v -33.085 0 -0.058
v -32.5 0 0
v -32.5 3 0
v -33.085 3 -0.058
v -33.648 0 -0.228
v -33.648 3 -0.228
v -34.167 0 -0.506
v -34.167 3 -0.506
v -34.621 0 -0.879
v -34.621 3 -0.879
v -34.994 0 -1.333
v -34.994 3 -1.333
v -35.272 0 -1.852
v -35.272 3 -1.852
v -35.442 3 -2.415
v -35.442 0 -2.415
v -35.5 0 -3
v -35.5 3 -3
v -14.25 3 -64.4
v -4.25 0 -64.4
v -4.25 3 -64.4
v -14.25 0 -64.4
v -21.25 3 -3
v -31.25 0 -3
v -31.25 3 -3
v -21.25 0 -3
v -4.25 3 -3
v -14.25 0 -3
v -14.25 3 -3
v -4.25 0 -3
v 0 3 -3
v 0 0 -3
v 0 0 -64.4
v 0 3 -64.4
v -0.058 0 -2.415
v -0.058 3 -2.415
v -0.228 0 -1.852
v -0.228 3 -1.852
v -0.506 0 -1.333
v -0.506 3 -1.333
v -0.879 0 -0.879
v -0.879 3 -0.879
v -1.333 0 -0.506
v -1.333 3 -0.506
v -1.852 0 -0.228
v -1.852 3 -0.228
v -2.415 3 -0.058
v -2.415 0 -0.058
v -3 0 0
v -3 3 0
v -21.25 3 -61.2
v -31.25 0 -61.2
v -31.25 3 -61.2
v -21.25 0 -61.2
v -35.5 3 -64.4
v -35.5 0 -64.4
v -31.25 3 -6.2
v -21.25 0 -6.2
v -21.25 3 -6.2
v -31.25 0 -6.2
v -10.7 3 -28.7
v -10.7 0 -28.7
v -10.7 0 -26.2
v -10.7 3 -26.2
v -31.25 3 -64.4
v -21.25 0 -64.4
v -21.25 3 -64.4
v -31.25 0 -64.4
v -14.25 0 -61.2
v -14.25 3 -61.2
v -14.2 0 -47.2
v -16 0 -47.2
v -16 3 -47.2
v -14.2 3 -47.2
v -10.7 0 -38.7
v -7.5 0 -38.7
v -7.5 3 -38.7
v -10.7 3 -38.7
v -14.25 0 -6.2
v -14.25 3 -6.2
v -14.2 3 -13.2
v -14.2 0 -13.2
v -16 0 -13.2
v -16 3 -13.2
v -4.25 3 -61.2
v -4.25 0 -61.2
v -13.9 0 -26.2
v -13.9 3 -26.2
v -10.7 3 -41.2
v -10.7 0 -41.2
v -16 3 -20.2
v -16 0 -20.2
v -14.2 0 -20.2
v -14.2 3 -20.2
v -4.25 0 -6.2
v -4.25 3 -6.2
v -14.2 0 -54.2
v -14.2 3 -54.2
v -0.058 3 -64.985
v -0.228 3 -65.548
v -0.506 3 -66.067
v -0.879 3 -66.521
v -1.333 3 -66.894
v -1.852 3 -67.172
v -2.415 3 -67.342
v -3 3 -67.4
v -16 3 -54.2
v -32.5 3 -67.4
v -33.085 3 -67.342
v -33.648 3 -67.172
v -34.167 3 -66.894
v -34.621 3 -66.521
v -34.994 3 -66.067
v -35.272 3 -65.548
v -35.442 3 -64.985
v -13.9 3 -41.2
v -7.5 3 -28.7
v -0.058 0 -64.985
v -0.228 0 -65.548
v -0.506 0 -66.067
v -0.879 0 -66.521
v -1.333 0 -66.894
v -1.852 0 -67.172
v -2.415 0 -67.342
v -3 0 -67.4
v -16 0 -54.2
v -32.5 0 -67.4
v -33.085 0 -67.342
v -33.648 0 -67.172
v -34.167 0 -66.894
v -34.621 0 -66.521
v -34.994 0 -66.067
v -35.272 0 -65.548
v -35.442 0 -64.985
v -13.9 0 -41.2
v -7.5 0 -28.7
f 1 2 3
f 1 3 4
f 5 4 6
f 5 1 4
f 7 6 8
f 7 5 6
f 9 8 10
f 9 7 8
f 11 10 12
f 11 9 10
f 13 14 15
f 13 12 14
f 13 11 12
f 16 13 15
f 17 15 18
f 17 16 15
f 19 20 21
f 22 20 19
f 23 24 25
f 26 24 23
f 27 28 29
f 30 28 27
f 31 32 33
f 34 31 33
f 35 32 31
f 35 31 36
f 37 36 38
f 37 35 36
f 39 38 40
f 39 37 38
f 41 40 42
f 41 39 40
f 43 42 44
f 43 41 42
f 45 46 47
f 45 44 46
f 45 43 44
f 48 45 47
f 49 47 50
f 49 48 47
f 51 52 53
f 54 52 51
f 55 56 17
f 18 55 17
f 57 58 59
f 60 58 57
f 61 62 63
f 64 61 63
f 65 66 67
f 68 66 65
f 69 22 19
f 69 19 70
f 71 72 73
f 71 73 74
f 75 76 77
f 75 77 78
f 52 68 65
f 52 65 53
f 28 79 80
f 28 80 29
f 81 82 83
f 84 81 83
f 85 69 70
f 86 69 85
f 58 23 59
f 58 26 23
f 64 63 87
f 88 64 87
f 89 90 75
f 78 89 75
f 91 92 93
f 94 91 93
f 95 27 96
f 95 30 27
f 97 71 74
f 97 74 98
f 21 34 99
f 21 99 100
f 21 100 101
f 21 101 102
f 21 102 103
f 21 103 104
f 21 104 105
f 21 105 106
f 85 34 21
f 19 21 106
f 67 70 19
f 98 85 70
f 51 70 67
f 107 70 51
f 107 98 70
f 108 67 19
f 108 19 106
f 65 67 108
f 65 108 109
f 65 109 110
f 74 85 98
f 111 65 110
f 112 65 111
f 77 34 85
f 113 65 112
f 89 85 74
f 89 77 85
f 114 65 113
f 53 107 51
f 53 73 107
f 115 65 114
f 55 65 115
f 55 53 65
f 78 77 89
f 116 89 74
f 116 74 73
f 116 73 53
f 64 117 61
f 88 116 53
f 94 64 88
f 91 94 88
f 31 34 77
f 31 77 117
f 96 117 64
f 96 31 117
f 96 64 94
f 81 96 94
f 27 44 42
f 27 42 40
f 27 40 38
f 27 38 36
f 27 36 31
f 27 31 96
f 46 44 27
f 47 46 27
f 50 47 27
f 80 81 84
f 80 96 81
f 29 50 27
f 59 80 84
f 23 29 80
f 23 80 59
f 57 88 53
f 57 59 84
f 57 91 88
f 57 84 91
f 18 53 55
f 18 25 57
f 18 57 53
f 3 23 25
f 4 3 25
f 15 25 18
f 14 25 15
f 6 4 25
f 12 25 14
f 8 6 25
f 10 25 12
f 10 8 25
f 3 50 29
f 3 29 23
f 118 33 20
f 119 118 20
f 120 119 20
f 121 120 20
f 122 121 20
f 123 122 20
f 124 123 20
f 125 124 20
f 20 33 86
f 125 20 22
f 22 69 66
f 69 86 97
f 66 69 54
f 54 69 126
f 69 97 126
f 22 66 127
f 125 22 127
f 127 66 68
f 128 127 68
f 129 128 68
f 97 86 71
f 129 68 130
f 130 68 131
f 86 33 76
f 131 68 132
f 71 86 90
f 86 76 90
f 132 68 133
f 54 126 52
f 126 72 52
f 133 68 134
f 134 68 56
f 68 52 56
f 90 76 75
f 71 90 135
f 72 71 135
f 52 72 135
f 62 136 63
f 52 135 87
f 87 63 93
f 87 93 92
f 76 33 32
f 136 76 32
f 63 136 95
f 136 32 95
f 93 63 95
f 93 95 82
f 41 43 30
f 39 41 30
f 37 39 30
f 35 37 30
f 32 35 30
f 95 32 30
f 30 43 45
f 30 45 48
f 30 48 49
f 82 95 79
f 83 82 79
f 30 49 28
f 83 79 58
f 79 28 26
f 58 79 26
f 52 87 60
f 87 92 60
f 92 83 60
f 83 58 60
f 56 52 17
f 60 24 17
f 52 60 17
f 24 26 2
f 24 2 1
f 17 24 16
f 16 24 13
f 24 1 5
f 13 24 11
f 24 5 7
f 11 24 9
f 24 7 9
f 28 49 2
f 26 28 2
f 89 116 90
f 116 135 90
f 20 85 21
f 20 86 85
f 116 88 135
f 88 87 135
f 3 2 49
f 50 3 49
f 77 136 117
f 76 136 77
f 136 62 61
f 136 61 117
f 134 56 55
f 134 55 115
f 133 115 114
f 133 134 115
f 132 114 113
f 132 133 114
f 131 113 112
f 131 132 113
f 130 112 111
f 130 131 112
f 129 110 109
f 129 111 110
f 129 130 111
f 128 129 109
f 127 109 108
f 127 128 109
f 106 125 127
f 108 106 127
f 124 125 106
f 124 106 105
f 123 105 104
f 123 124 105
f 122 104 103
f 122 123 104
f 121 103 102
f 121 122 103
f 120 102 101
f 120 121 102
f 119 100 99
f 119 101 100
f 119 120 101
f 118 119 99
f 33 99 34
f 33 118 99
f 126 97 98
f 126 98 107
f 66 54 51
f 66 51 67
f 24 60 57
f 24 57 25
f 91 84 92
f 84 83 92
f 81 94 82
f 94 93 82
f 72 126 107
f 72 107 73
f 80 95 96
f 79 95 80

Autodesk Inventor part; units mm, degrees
ref_plane "YZ Plane" through (0, 0, 0) normal (1, 0, 0) x (0, 1, 0)
ref_plane "XZ Plane" through (0, 0, 0) normal (0, 1, 0) x (-1, 0, 0)
ref_plane "XY Plane" through (0, 0, 0) normal (0, 0, 1) x (1, 0, 0)
sketch "Sketch1" plane through (0, 0, 0) normal (0, 1, 0) x (-1, 0, 0)
  line L0 (17.75, -20.2435) -> (17.75, -42.6397) construction
  line L1 (13.2323, -33.7) -> (6.4845, -33.7) construction
  line L2 (35.5, -64.4) -> (35.5, -3)
  line L3 (0, -3) -> (0, -64.4)
  line L4 (32.5, 0) -> (3, 0)
  line L5 (3, -67.4) -> (32.5, -67.4)
  line L6 (16, -20.2) -> (14.2, -20.2)
  line L7 (14.2, -20.2) -> (14.2, -13.2)
  line L8 (14.2, -13.2) -> (16, -13.2)
  line L9 (16, -13.2) -> (16, -20.2)
  line L10 (31.25, -3) -> (21.25, -3)
  line L11 (21.25, -3) -> (21.25, -6.2)
  line L12 (21.25, -6.2) -> (31.25, -6.2)
  line L13 (31.25, -6.2) -> (31.25, -3)
  line L14 (14.25, -3) -> (4.25, -3)
  line L15 (4.25, -3) -> (4.25, -6.2)
  line L16 (4.25, -6.2) -> (14.25, -6.2)
  line L17 (14.25, -6.2) -> (14.25, -3)
  line L18 (31.25, -61.2) -> (21.25, -61.2)
  line L19 (21.25, -61.2) -> (21.25, -64.4)
  line L20 (21.25, -64.4) -> (31.25, -64.4)
  line L21 (31.25, -64.4) -> (31.25, -61.2)
  line L22 (14.25, -61.2) -> (4.25, -61.2)
  line L23 (4.25, -61.2) -> (4.25, -64.4)
  line L24 (4.25, -64.4) -> (14.25, -64.4)
  line L25 (14.25, -64.4) -> (14.25, -61.2)
  line L26 (10.7, -28.7) -> (7.5, -28.7)
  line L27 (7.5, -28.7) -> (7.5, -38.7)
  line L28 (7.5, -38.7) -> (10.7, -38.7)
  line L29 (10.7, -28.7) -> (10.7, -26.2)
  line L30 (10.7, -26.2) -> (13.9, -26.2)
  line L31 (13.9, -26.2) -> (13.9, -41.2)
  line L32 (13.9, -41.2) -> (10.7, -41.2)
  line L33 (10.7, -41.2) -> (10.7, -38.7)
  arc A0 (35.5, -3) -> (32.5, 0) centre (32.5, -3) ccw
  arc A1 (32.5, -67.4) -> (35.5, -64.4) centre (32.5, -64.4) ccw
  arc A2 (0, -64.4) -> (3, -67.4) centre (3, -64.4) ccw
  arc A3 (3, 0) -> (0, -3) centre (3, -3) ccw
  line L34 (16, -47.2) -> (14.2, -47.2)
  line L35 (14.2, -47.2) -> (14.2, -54.2)
  line L36 (14.2, -54.2) -> (16, -54.2)
  line L37 (16, -54.2) -> (16, -47.2)
  point P0 (0, 0)
  dimension "d22" = 7
  dimension "d24" = 1.8
  dimension "d27" = 10
  dimension "d28" = 3.2
  dimension "d30" = 3
  dimension "d31" = 7
  dimension "d33" = 10
  dimension "d34" = 15
  dimension "d35" = 6
  dimension "d39" = 7
  dimension "d52" = 35.5
  dimension "d53" = 4.25
  dimension "d54" = 7.5
  dimension "d55" = 3.5
  dimension "d56" = 55
extrude "Extrusion1" add sketch "Sketch1" along normal blind 3
properties part number "Front_wall"
